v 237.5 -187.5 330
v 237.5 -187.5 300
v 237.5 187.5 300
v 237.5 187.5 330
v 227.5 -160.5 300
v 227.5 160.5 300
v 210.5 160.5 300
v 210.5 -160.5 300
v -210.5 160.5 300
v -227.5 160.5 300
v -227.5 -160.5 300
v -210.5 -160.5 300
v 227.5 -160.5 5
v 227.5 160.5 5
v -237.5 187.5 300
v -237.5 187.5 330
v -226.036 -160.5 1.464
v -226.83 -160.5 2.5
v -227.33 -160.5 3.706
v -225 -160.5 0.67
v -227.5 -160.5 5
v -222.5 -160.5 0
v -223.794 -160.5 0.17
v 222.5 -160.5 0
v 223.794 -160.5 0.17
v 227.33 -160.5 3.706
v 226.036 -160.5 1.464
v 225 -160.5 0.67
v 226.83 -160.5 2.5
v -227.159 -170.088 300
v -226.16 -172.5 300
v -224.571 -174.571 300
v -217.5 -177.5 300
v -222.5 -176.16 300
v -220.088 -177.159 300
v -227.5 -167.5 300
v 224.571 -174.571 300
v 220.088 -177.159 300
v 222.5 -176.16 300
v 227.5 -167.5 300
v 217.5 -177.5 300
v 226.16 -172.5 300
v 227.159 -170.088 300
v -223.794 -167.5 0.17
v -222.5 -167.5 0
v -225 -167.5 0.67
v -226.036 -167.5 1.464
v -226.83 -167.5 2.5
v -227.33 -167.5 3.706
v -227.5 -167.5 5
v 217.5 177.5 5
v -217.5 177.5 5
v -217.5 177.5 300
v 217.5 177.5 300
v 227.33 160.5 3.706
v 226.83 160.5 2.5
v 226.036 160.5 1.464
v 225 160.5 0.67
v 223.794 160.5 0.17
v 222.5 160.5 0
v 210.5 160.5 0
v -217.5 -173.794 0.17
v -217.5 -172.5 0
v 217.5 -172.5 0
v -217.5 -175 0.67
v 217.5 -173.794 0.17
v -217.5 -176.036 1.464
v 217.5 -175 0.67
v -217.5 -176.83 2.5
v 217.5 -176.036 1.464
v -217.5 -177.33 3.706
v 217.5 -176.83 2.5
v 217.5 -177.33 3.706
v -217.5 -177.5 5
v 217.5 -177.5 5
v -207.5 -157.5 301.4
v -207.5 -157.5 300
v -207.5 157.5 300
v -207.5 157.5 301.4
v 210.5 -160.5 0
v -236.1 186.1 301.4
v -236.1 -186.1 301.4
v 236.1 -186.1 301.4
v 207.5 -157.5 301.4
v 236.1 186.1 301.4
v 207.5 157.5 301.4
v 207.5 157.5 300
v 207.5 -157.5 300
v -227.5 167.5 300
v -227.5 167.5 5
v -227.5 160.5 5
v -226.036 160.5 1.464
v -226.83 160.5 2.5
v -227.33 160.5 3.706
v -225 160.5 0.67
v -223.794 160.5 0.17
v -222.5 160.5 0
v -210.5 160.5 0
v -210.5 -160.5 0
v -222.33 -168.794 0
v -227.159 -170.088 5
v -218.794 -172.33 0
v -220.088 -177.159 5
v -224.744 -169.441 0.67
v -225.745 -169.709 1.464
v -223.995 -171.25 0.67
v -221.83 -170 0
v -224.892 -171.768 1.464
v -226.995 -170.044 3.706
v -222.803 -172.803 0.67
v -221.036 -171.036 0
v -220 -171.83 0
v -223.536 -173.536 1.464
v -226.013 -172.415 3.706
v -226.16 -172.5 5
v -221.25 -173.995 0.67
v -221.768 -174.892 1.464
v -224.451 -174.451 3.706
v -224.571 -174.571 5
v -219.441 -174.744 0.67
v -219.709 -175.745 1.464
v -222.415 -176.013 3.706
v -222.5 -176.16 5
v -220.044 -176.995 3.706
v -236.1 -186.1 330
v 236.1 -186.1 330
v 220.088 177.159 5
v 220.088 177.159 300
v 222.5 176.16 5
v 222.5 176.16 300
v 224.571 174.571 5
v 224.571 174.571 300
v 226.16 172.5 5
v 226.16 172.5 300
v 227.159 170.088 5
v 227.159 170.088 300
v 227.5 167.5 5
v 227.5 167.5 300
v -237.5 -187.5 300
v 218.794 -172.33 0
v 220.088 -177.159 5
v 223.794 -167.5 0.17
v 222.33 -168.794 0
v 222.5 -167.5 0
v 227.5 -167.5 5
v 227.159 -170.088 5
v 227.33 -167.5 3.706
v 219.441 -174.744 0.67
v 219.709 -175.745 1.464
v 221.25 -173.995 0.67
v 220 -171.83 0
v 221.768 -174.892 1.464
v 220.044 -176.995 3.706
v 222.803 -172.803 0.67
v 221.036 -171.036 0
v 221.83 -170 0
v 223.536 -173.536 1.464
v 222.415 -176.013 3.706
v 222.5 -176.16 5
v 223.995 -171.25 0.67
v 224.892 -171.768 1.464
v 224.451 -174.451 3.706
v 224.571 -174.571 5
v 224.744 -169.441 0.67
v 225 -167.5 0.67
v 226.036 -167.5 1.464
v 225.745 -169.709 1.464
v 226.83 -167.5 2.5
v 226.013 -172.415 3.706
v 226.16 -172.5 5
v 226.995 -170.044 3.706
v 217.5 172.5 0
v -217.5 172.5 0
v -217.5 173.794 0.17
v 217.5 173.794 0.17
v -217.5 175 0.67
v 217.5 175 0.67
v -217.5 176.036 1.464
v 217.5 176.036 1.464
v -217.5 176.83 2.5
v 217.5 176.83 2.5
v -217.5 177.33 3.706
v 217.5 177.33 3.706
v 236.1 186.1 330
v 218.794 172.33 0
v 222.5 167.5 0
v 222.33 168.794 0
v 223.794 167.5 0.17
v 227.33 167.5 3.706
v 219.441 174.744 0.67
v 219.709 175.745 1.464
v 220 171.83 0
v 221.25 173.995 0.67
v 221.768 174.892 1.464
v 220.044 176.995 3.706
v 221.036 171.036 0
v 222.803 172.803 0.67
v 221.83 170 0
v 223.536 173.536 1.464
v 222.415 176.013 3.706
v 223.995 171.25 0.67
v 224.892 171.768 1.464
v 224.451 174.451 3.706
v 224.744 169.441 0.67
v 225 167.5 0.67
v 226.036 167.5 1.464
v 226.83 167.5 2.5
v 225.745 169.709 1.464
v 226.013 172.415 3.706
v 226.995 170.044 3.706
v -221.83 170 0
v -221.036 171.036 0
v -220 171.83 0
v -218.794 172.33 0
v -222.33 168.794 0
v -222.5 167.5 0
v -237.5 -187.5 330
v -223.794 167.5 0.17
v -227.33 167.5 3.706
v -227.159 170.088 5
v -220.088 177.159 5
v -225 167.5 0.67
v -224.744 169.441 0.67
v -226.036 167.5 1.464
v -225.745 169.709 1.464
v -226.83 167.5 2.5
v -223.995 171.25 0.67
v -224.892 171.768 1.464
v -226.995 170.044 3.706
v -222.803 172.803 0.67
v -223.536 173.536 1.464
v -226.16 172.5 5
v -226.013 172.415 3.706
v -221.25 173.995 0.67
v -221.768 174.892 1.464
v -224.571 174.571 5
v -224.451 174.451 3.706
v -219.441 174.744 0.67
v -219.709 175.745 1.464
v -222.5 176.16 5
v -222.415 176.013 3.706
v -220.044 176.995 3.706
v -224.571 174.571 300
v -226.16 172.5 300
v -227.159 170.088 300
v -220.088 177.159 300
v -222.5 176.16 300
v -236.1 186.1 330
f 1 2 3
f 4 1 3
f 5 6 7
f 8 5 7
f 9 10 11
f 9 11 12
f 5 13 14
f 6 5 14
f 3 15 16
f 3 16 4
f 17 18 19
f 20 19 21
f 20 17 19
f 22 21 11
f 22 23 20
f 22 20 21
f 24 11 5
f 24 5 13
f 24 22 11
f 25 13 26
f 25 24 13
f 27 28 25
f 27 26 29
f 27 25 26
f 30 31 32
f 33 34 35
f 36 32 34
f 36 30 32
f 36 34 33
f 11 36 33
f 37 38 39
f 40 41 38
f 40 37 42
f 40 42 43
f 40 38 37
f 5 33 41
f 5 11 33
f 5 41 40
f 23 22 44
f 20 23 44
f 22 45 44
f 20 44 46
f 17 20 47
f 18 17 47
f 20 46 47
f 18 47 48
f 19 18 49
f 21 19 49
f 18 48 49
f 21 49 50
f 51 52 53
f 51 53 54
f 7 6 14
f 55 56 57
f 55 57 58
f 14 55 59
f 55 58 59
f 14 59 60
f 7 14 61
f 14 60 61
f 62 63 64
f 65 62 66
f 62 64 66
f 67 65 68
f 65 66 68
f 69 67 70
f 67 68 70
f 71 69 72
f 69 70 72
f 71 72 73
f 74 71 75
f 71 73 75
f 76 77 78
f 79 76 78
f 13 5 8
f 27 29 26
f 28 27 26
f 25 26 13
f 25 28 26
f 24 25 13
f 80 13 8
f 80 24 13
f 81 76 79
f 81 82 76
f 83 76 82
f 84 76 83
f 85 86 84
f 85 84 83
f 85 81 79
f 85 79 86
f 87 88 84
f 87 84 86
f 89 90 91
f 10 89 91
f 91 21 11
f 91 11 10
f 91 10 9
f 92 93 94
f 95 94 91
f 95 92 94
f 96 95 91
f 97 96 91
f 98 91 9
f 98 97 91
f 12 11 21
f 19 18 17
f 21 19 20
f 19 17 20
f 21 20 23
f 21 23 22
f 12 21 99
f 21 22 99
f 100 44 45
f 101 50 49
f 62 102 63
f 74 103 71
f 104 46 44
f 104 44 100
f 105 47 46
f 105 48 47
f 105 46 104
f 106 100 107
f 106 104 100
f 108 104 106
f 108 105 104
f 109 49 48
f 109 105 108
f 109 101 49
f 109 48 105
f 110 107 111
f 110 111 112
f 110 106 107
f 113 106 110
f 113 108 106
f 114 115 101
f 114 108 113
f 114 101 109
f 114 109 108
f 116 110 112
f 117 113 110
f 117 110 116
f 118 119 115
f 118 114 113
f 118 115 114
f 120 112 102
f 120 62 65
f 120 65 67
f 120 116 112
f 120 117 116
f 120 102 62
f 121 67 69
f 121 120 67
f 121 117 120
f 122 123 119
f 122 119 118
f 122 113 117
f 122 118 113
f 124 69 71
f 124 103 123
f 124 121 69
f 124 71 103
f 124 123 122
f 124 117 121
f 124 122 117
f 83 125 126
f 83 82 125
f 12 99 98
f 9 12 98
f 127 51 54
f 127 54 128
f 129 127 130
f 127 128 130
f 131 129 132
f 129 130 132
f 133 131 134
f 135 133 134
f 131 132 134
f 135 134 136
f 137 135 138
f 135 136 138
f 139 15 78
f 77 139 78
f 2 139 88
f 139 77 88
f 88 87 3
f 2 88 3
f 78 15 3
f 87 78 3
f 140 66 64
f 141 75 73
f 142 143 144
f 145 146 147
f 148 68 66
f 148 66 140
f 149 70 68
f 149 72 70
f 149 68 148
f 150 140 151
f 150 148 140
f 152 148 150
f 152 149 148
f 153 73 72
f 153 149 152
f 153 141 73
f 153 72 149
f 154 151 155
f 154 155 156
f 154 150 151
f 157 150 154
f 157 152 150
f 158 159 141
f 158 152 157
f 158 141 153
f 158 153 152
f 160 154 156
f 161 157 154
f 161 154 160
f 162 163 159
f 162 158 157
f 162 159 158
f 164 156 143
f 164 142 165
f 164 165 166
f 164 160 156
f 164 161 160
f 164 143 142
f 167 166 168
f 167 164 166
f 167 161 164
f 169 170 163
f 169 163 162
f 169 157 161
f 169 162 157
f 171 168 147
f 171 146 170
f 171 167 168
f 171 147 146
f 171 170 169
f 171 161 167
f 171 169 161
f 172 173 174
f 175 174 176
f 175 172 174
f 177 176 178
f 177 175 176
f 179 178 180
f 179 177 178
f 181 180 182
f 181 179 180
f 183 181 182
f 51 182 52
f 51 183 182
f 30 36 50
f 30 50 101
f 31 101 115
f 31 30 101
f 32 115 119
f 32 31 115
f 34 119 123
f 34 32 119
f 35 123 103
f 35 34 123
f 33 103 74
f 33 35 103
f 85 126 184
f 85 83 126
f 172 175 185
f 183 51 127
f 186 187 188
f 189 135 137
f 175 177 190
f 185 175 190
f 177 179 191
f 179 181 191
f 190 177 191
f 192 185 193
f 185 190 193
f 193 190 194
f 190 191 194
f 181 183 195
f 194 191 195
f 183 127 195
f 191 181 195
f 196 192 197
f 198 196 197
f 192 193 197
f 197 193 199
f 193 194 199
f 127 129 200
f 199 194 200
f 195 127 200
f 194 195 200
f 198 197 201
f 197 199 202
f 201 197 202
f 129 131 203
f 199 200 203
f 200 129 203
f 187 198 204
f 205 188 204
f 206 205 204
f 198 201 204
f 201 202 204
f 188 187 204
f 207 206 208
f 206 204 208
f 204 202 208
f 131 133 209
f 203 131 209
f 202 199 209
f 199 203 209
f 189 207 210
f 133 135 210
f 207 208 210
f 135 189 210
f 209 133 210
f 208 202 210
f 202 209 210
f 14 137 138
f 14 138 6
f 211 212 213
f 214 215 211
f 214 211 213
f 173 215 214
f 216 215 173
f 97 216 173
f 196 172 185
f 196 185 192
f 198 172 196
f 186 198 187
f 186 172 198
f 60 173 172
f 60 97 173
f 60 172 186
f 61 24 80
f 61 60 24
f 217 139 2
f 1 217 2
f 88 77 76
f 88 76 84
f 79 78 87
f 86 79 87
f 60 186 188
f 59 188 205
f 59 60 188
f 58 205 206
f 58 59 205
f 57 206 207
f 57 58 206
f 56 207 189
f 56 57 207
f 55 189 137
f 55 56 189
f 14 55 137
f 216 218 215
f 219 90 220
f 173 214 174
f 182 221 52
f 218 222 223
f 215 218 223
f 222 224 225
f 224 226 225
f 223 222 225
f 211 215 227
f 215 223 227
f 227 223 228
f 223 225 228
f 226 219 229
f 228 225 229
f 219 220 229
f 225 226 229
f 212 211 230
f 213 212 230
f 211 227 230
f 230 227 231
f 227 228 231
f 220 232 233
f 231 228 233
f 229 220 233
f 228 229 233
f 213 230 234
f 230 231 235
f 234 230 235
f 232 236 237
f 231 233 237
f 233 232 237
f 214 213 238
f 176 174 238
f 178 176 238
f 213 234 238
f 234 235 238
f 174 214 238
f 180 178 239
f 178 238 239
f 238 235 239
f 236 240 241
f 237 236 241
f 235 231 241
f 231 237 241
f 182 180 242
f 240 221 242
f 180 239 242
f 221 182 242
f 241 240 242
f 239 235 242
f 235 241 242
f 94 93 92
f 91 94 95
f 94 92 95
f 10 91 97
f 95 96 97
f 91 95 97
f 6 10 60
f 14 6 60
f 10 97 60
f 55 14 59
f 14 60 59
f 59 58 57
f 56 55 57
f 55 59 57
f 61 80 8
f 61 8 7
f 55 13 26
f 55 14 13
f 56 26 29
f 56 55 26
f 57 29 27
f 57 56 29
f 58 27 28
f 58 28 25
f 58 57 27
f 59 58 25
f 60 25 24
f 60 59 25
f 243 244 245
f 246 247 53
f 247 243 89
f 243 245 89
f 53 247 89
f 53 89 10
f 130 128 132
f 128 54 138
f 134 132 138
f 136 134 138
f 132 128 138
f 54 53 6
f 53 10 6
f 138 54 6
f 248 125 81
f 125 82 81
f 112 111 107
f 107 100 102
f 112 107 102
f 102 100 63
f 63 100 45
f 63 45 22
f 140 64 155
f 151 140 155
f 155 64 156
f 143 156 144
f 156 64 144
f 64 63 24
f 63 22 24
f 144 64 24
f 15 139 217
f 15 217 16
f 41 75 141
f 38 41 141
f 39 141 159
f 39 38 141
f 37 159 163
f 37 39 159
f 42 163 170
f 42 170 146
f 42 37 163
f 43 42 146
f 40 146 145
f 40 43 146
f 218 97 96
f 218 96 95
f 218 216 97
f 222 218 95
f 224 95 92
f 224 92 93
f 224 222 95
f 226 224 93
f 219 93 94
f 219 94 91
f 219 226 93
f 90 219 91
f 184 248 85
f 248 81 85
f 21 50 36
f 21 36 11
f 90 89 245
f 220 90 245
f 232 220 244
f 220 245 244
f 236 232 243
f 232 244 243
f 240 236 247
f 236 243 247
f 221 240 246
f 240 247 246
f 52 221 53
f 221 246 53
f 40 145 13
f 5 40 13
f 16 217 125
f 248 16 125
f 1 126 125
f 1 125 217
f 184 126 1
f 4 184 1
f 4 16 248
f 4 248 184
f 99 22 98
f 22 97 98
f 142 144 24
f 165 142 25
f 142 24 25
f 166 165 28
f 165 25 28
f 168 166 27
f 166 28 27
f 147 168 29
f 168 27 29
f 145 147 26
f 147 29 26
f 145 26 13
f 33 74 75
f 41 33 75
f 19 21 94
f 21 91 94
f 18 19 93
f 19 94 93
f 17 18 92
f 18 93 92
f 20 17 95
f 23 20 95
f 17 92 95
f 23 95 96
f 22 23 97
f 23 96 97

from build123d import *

# Parameters (mm, degrees)
F0_W      = 455
F0_H      = 17
F1_DEPTH  = 300
F2_R      = 10
F3_R      = 5
F4_W      = 17
F4_H      = 321
F5_DEPTH  = 300
F6_R      = 5
F9_W      = 475
F9_H      = 375
F9_W_2    = 415
F9_H_2    = 315
F10_DEPTH = 30
F11_T     = -1.4


with BuildPart() as f1:
    # F0 (on Top) → F1 (new body)
    with BuildSketch(Plane.XY):
        with Locations((0, -169)):
            Rectangle(F0_W, F0_H)
    extrude(amount=F1_DEPTH)

    # F2
    f2_edges = [f1.edges().sort_by_distance(p)[0] for p in [
        (-227.5, -177.5, 150),
        (227.5, -177.5, 150),
    ]]
    fillet(f2_edges, radius=F2_R)

    # F3
    f3_edges = [f1.edges().sort_by_distance(p)[0] for p in [
        (0, -177.5, 0),
    ]]
    fillet(f3_edges, radius=F3_R)


with BuildPart() as f5:
    # F4 (on Top) → F5 (new body)
    with BuildSketch(Plane.XY):
        with Locations((-219, 0)):
            Rectangle(F4_W, F4_H)
    extrude(amount=F5_DEPTH)

    # F6
    f6_edges = [f5.edges().sort_by_distance(p)[0] for p in [
        (-227.5, 0, 0),
    ]]
    fillet(f6_edges, radius=F6_R)


with BuildPart() as f7_1:
    # F7: instance of F1
    add(f1.part.mirror(Plane.XZ))


with BuildPart() as f8_1:
    # F8: instance of F5
    add(f5.part.mirror(Plane.YZ))


with BuildPart() as f10:
    # F9 (on face) → F10 (new body)
    with BuildSketch(Plane.XY.offset(300)):
        Rectangle(F9_W, F9_H)
        Rectangle(F9_W_2, F9_H_2, mode=Mode.SUBTRACT)
    extrude(amount=F10_DEPTH)

    # F11
    f11_openings = [f10.faces().sort_by_distance(p)[0] for p in [
        (231.448141, 0, 330),
        (0, 157.5, 315),
        (-207.5, 0, 315),
        (207.5, 0, 315),
        (0, -157.5, 315),
    ]]
    offset(amount=F11_T, openings=f11_openings)


solid = Compound([f1.part, f5.part, f7_1.part, f8_1.part, f10.part])
